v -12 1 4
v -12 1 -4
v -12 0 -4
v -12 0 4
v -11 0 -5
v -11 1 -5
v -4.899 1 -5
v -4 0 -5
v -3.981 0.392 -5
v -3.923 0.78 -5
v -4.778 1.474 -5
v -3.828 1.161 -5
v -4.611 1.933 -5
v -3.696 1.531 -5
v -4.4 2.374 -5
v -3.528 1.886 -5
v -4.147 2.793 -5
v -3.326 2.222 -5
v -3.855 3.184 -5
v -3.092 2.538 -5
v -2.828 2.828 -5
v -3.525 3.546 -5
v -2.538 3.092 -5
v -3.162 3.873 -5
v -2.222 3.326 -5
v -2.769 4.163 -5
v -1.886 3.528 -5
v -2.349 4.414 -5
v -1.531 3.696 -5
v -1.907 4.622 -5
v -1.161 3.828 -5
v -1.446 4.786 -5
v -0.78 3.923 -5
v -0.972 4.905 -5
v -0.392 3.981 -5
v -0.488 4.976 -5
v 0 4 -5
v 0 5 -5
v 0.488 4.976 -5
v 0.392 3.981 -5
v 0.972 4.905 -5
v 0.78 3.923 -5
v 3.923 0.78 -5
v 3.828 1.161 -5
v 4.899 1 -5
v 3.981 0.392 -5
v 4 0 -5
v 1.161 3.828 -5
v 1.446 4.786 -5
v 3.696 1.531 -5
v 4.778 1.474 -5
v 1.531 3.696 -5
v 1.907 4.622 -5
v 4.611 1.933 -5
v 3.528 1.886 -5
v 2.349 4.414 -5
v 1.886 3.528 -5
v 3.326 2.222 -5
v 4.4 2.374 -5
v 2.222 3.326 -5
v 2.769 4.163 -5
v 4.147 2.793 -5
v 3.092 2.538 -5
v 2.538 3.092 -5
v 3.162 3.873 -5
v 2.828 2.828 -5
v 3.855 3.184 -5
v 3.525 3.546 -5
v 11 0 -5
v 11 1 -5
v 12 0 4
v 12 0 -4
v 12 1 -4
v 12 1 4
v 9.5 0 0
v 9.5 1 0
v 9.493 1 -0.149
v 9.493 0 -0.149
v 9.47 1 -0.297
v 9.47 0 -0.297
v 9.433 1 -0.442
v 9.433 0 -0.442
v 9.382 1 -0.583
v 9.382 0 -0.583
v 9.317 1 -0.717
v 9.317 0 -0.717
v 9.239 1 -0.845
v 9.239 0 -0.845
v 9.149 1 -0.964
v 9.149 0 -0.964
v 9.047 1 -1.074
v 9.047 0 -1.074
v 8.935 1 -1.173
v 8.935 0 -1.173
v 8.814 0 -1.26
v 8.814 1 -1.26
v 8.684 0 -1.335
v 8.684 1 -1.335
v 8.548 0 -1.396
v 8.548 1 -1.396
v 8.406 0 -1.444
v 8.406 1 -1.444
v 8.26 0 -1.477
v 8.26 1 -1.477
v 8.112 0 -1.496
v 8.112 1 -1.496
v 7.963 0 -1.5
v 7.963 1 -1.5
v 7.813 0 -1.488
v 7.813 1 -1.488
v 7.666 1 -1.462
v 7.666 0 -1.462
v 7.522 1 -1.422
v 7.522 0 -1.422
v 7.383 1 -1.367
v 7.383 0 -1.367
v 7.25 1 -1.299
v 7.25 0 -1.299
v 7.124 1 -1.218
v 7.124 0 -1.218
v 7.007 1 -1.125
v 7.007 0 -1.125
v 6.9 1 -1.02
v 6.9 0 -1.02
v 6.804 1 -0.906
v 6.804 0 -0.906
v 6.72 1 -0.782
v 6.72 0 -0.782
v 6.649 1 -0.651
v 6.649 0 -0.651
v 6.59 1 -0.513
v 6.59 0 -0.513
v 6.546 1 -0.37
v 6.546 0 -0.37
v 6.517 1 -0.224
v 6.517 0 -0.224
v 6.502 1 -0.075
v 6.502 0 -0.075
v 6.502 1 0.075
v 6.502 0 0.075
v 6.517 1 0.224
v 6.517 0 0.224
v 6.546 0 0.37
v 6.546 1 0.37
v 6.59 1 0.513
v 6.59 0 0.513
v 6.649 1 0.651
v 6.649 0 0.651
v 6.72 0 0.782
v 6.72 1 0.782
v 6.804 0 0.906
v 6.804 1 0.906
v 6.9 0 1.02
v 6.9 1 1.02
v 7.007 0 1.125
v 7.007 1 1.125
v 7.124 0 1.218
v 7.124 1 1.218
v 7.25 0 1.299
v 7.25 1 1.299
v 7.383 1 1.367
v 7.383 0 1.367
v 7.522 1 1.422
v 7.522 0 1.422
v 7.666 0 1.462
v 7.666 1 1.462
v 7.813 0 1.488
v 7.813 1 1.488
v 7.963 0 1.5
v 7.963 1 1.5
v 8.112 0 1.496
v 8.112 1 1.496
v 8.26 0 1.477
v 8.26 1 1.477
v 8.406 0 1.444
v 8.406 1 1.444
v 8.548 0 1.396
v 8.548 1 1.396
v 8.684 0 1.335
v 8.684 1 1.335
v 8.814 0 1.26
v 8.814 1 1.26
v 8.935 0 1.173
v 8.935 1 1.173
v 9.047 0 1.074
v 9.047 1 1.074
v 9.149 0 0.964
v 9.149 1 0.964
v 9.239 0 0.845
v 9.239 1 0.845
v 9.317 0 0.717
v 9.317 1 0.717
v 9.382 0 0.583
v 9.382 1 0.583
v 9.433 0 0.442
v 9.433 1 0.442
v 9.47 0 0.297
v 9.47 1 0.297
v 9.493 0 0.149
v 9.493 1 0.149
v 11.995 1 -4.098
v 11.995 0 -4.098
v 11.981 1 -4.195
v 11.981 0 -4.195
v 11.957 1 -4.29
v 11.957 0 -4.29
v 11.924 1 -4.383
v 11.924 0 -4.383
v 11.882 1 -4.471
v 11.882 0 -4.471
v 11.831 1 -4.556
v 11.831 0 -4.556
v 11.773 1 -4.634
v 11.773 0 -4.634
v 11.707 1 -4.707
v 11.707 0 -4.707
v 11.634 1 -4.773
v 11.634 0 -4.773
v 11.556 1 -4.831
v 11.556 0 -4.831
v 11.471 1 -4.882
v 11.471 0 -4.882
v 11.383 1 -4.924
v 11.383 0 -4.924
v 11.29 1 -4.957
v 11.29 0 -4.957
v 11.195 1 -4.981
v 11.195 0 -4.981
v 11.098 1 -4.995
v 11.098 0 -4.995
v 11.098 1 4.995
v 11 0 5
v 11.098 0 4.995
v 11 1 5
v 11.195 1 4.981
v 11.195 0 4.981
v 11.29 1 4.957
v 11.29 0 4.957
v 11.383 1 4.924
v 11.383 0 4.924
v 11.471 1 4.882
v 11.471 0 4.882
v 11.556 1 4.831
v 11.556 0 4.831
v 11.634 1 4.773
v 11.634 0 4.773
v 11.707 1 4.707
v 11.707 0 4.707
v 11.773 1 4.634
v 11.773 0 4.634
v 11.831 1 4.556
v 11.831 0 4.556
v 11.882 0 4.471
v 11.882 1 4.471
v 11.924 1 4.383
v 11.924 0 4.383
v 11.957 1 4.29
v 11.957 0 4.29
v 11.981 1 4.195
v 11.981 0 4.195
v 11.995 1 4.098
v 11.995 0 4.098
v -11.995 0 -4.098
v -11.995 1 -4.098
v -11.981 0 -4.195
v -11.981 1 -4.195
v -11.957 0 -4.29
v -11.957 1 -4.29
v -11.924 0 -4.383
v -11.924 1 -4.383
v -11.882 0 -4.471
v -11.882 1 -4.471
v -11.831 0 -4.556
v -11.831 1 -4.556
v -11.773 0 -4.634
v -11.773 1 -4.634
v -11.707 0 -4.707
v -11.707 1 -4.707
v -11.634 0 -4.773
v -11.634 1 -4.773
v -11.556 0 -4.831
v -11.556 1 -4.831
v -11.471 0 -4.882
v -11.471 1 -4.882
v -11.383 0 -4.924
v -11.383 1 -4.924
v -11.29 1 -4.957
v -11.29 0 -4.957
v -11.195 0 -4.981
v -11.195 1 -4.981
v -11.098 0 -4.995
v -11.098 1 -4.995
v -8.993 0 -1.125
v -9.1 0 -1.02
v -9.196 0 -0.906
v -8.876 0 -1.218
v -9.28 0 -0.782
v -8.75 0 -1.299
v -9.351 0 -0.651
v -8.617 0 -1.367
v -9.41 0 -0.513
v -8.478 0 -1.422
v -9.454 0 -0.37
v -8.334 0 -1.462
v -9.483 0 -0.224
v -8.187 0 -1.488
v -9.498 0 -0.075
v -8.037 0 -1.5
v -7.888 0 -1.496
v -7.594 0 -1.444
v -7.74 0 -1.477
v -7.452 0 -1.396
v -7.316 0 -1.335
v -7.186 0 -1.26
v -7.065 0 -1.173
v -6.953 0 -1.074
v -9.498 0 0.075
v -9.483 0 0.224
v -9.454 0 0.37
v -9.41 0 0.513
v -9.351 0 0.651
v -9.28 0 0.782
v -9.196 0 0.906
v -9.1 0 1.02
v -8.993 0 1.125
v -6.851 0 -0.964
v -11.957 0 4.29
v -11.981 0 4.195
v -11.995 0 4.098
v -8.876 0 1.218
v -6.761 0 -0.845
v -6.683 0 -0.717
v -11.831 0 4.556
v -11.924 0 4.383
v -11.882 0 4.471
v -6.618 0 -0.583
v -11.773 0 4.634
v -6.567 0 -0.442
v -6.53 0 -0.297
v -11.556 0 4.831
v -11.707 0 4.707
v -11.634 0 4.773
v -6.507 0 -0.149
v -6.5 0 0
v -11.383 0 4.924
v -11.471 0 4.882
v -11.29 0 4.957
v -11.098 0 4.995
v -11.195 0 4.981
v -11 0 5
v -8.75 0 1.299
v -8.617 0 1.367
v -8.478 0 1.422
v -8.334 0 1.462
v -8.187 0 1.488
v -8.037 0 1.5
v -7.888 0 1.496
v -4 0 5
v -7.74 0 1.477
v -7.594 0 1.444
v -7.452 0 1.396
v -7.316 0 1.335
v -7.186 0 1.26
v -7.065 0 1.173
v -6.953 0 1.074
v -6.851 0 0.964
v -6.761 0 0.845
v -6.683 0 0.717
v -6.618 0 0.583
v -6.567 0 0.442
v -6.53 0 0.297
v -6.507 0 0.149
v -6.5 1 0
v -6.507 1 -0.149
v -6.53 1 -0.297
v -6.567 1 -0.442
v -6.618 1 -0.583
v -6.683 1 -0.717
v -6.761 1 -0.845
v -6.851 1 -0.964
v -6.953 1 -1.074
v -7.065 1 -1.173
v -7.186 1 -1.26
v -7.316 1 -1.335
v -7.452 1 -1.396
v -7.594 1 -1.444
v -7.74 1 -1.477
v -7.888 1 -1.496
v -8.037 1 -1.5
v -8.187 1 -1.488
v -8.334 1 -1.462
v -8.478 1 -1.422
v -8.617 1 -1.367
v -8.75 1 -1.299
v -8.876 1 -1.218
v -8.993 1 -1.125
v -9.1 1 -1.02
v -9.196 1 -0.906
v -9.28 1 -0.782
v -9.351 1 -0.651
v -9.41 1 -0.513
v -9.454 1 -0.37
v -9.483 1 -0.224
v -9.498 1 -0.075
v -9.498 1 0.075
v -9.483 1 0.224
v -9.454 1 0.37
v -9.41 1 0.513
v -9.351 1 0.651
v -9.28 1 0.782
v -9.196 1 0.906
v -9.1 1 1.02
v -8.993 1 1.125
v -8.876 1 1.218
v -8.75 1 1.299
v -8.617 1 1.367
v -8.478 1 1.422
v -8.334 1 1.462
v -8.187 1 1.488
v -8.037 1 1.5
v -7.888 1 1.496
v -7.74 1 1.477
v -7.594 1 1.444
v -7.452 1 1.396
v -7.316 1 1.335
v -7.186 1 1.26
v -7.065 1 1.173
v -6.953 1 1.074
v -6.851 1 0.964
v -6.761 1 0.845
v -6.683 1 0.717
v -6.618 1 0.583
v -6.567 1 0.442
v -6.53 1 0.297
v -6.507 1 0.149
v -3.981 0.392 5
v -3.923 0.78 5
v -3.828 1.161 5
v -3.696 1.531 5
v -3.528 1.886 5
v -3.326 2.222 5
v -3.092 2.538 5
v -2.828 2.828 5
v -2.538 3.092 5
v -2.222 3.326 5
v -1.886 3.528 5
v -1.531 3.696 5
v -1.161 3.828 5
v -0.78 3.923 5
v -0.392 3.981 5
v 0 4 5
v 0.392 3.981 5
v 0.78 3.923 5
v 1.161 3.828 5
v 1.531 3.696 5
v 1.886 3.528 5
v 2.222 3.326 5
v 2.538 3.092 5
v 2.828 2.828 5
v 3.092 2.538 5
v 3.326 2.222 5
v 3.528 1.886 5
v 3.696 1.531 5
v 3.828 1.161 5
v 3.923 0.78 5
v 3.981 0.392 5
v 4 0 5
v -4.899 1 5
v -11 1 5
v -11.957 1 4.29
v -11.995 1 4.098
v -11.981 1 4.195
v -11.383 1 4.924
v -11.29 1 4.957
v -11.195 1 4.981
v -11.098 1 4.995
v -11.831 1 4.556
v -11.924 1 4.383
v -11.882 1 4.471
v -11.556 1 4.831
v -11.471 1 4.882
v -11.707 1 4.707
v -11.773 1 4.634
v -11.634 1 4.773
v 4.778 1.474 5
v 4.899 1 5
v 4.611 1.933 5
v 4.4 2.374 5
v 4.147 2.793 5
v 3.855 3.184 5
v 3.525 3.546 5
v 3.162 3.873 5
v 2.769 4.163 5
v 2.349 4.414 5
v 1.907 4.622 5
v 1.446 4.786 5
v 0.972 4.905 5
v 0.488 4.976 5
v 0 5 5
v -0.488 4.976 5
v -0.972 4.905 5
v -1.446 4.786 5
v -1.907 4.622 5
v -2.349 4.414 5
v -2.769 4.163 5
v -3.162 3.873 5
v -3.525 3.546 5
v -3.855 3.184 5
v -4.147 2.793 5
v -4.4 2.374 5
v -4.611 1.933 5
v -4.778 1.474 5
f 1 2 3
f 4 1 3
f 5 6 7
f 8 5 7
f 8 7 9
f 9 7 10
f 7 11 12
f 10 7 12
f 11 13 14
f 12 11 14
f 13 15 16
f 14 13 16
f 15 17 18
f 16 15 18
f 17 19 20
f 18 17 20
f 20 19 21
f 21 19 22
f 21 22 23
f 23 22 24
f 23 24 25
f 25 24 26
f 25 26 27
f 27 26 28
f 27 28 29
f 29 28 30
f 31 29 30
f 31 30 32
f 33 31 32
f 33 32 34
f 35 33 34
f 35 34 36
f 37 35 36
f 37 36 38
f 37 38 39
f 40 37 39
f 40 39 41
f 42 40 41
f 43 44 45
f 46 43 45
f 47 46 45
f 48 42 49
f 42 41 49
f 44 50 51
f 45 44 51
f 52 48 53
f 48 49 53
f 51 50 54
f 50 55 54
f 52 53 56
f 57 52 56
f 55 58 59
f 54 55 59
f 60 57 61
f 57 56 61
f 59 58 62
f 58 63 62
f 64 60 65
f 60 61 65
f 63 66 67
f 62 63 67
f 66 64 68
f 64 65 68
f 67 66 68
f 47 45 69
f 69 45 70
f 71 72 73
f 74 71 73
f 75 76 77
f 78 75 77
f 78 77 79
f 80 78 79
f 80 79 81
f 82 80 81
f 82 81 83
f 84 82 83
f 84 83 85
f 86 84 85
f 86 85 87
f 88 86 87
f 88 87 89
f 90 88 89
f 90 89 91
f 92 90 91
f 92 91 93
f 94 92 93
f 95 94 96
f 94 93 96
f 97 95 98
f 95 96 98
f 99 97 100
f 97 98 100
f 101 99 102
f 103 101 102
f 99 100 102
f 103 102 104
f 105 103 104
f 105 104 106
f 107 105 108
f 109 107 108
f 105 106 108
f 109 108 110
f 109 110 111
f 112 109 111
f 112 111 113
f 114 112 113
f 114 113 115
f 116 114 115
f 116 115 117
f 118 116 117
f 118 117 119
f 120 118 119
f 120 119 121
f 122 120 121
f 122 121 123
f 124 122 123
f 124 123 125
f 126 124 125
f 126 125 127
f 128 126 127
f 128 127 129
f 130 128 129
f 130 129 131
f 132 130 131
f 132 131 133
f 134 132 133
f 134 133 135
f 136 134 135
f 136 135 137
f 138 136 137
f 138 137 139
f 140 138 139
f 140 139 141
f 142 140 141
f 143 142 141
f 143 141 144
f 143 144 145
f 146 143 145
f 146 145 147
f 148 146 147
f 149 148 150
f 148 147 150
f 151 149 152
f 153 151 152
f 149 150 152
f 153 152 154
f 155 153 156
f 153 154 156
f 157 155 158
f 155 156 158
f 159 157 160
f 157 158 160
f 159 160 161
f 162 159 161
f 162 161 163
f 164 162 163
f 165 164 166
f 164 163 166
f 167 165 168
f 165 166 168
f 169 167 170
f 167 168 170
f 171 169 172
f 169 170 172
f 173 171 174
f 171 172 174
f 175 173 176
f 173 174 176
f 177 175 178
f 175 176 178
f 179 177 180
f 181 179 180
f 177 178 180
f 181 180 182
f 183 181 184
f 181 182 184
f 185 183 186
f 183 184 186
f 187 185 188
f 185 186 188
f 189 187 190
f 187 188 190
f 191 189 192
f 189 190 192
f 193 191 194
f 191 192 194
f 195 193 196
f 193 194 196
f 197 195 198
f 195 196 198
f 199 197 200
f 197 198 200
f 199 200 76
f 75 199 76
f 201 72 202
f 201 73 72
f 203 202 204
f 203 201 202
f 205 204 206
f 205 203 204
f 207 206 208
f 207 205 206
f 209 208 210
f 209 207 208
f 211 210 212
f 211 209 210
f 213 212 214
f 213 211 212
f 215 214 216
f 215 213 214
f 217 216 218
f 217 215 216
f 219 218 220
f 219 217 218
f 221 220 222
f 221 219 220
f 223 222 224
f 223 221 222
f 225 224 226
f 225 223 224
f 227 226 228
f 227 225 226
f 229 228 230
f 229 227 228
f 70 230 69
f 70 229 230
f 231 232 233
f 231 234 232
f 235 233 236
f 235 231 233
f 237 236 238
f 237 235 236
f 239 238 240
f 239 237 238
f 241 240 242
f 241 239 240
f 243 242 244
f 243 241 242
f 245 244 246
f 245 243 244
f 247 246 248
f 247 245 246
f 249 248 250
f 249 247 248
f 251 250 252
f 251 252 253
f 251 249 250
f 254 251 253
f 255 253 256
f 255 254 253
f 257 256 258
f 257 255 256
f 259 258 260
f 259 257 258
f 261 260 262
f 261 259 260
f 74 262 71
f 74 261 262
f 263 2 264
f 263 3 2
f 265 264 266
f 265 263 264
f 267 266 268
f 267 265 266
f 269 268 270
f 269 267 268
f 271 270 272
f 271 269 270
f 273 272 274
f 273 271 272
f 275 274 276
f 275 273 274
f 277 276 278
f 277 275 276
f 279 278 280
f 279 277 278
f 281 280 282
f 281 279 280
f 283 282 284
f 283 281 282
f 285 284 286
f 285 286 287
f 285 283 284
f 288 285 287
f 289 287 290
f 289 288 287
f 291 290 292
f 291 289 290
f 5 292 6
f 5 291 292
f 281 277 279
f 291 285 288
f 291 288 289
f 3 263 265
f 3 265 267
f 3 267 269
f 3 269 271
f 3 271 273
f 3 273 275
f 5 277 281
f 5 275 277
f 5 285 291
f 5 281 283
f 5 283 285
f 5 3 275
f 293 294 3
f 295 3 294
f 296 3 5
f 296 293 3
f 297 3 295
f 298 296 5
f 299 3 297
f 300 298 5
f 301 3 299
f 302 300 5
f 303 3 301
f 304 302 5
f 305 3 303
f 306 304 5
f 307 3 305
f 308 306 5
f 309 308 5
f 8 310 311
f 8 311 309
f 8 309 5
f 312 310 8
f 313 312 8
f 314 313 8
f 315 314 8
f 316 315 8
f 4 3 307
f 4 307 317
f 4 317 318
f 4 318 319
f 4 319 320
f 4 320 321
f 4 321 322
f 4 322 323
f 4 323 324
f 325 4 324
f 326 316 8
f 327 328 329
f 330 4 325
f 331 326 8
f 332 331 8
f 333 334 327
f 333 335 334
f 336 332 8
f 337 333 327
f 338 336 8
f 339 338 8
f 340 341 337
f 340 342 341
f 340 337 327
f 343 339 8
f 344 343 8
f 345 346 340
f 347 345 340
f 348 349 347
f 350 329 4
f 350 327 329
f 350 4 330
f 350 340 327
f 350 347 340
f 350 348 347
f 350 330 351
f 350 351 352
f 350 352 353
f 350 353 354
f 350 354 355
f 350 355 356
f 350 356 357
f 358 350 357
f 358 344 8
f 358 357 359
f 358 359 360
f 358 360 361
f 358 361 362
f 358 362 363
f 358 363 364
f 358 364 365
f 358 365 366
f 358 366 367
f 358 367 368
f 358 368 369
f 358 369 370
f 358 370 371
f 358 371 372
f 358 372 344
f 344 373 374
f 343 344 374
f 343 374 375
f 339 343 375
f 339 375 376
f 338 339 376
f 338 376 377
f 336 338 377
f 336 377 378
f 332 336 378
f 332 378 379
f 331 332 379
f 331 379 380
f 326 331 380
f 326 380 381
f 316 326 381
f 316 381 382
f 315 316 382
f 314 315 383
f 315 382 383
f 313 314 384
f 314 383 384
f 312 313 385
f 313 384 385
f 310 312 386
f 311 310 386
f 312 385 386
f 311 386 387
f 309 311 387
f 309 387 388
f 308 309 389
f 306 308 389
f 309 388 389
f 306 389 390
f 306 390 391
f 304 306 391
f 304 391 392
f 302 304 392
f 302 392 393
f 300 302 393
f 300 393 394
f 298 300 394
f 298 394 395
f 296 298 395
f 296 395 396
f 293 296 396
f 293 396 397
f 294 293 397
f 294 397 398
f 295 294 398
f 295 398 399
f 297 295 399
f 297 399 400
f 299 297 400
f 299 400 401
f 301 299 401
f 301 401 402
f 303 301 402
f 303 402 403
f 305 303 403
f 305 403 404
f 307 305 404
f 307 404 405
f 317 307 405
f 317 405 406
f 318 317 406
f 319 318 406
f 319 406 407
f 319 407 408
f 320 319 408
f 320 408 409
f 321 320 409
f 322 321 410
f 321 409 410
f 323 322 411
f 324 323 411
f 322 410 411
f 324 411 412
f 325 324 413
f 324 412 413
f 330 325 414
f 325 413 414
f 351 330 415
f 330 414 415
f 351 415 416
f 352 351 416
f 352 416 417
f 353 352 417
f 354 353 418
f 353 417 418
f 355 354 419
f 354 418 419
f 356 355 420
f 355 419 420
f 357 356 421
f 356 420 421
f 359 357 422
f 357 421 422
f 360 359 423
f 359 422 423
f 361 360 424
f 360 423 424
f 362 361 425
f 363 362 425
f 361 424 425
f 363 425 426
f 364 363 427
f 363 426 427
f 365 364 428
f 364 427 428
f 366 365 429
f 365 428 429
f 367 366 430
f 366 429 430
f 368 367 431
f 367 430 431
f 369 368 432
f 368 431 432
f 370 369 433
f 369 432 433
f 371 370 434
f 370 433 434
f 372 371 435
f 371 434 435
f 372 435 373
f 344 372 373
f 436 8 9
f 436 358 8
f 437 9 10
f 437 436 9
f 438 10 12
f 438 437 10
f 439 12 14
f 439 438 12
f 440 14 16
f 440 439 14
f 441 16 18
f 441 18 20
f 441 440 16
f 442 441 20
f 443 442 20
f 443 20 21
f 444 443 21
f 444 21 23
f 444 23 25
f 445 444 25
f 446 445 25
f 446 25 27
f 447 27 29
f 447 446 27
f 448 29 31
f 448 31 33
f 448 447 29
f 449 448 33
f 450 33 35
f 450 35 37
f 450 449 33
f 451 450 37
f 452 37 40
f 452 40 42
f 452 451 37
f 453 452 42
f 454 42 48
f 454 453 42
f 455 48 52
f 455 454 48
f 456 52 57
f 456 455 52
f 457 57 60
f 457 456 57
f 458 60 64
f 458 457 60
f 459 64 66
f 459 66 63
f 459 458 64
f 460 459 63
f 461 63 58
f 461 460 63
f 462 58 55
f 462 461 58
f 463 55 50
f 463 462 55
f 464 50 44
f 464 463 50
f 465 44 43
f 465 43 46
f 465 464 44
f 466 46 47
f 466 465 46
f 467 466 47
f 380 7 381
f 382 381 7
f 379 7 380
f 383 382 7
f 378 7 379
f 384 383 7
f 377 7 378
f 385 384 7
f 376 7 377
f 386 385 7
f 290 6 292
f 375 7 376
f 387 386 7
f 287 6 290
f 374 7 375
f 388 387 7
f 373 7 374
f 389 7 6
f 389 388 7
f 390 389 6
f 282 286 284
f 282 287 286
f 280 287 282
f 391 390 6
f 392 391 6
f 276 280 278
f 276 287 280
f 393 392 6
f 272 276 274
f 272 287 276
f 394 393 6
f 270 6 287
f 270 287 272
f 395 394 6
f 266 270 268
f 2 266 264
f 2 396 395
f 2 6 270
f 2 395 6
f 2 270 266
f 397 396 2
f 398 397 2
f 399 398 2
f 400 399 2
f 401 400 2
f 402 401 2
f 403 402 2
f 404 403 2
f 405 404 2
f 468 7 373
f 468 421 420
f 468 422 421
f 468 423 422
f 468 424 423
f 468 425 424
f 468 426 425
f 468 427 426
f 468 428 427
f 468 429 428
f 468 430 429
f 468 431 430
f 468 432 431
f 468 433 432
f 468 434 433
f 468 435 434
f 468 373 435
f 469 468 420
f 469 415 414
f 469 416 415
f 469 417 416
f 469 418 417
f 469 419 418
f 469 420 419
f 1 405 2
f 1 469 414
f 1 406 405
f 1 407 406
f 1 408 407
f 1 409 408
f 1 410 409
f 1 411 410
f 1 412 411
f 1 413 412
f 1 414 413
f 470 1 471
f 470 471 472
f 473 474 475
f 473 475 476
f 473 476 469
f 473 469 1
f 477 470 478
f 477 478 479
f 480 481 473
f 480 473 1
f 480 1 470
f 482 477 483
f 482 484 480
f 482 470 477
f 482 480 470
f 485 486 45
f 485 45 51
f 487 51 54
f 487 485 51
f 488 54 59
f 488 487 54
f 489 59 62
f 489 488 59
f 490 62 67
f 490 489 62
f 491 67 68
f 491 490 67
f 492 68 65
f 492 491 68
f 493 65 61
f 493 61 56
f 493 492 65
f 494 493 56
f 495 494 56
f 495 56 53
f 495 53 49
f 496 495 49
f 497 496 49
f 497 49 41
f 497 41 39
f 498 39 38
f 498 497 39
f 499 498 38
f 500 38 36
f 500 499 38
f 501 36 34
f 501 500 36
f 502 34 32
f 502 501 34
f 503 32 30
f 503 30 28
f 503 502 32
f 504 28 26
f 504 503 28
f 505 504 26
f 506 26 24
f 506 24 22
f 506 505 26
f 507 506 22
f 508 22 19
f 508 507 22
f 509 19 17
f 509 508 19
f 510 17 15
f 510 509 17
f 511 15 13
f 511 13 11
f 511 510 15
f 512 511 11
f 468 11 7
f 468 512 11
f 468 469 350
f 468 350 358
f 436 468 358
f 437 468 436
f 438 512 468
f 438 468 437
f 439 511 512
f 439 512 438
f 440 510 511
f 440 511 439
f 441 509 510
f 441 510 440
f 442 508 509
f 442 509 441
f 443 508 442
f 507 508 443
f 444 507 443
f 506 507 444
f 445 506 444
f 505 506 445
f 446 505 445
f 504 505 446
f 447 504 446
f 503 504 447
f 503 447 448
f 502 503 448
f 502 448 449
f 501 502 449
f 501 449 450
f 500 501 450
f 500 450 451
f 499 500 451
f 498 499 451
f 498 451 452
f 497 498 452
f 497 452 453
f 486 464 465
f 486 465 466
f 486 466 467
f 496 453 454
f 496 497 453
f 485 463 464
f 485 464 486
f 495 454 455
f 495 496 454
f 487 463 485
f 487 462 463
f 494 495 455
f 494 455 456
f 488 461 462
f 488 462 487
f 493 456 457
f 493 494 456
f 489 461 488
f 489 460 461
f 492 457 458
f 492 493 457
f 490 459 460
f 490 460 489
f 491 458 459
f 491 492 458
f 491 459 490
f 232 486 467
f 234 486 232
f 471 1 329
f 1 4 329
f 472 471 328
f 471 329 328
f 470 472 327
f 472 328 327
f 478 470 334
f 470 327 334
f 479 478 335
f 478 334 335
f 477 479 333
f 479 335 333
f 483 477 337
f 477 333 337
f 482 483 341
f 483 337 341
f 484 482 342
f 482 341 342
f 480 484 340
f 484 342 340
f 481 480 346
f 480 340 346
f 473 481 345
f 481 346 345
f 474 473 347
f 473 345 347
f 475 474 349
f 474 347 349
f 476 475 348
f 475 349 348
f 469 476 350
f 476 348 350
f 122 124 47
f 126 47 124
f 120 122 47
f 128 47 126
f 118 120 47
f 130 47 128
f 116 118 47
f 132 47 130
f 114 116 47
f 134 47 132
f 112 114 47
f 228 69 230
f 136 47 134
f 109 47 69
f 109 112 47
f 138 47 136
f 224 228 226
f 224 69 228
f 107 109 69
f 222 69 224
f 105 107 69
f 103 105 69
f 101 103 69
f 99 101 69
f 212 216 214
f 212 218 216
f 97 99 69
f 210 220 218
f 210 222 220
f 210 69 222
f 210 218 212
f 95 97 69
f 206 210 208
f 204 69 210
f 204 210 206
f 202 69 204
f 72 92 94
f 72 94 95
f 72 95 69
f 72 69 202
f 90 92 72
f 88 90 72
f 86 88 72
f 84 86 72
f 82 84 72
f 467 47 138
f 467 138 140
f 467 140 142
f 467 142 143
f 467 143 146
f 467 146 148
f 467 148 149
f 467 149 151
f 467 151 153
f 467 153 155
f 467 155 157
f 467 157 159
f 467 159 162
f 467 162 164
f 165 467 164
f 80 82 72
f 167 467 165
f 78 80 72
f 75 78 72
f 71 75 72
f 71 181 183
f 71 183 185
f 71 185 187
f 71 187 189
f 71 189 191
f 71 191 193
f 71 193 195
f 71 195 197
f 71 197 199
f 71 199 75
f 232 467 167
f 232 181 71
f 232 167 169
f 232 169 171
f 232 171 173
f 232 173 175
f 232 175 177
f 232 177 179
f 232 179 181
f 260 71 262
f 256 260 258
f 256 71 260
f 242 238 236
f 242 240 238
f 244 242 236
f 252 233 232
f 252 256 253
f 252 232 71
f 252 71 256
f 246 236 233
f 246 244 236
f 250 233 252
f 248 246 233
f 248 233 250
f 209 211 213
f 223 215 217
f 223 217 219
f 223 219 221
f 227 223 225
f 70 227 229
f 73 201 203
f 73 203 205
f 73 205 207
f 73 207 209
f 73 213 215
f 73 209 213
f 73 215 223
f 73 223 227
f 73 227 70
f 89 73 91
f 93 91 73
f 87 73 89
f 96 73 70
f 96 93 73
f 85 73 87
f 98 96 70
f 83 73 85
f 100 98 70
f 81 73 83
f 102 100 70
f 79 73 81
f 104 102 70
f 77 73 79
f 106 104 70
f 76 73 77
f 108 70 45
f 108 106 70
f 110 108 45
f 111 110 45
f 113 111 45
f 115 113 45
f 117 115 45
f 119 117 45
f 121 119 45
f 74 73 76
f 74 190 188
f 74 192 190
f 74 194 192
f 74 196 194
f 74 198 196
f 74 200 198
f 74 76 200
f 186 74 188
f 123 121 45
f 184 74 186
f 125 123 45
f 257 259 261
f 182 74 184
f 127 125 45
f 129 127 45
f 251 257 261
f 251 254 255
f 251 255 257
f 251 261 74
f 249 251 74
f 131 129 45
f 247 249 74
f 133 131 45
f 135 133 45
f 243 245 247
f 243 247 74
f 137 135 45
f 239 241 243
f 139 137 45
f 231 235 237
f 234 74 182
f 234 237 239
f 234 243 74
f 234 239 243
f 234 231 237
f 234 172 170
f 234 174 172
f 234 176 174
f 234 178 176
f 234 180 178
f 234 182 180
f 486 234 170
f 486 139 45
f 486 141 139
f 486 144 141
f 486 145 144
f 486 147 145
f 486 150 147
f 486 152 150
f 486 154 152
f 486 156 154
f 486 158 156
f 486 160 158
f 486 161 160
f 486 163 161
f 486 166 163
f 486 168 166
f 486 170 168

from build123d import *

# Parameters (mm, degrees)
BOSS_EXTRUDE1_DEPTH = 5
FILLET1_R           = 1
SKETCH2_R           = 1.5
CUT_EXTRUDE1_DEPTH  = 10


with BuildPart() as part:
    # Sketch1 → Boss-Extrude1 (new body, symmetric)
    with BuildSketch(Plane.XY):
        with BuildLine():
            Line((4, 0), (12, 0))
            Line((12, 0), (12, 1))
            Line((12, 1), (4.898979486, 1))
            ThreePointArc((4.898979486, 1), (0, 5), (-4.898979486, 1))
            Line((-4.898979486, 1), (-12, 1))
            Line((-12, 1), (-12, 0))
            Line((-12, 0), (-4, 0))
            ThreePointArc((-4, 0), (0, 4), (4, 0))
        make_face()
    extrude(amount=BOSS_EXTRUDE1_DEPTH, both=True)

    # Fillet1
    fillet1_edges = [part.edges().sort_by_distance(p)[0] for p in [
        (-12, 0.5, -5),
        (-12, 0.5, 5),
        (12, 0.5, 5),
        (12, 0.5, -5),
    ]]
    fillet(fillet1_edges, radius=FILLET1_R)

    # Sketch2 → Cut-Extrude1 (cut)
    with BuildSketch(Plane(origin=(0, 1, 0), x_dir=(1, 0, 0), z_dir=(0, 1, 0))):
        with Locations((-8, 0)):
            Circle(SKETCH2_R)
        with Locations((8, 0)):
            Circle(SKETCH2_R)
    extrude(amount=-CUT_EXTRUDE1_DEPTH, mode=Mode.SUBTRACT)


solid = part.part
